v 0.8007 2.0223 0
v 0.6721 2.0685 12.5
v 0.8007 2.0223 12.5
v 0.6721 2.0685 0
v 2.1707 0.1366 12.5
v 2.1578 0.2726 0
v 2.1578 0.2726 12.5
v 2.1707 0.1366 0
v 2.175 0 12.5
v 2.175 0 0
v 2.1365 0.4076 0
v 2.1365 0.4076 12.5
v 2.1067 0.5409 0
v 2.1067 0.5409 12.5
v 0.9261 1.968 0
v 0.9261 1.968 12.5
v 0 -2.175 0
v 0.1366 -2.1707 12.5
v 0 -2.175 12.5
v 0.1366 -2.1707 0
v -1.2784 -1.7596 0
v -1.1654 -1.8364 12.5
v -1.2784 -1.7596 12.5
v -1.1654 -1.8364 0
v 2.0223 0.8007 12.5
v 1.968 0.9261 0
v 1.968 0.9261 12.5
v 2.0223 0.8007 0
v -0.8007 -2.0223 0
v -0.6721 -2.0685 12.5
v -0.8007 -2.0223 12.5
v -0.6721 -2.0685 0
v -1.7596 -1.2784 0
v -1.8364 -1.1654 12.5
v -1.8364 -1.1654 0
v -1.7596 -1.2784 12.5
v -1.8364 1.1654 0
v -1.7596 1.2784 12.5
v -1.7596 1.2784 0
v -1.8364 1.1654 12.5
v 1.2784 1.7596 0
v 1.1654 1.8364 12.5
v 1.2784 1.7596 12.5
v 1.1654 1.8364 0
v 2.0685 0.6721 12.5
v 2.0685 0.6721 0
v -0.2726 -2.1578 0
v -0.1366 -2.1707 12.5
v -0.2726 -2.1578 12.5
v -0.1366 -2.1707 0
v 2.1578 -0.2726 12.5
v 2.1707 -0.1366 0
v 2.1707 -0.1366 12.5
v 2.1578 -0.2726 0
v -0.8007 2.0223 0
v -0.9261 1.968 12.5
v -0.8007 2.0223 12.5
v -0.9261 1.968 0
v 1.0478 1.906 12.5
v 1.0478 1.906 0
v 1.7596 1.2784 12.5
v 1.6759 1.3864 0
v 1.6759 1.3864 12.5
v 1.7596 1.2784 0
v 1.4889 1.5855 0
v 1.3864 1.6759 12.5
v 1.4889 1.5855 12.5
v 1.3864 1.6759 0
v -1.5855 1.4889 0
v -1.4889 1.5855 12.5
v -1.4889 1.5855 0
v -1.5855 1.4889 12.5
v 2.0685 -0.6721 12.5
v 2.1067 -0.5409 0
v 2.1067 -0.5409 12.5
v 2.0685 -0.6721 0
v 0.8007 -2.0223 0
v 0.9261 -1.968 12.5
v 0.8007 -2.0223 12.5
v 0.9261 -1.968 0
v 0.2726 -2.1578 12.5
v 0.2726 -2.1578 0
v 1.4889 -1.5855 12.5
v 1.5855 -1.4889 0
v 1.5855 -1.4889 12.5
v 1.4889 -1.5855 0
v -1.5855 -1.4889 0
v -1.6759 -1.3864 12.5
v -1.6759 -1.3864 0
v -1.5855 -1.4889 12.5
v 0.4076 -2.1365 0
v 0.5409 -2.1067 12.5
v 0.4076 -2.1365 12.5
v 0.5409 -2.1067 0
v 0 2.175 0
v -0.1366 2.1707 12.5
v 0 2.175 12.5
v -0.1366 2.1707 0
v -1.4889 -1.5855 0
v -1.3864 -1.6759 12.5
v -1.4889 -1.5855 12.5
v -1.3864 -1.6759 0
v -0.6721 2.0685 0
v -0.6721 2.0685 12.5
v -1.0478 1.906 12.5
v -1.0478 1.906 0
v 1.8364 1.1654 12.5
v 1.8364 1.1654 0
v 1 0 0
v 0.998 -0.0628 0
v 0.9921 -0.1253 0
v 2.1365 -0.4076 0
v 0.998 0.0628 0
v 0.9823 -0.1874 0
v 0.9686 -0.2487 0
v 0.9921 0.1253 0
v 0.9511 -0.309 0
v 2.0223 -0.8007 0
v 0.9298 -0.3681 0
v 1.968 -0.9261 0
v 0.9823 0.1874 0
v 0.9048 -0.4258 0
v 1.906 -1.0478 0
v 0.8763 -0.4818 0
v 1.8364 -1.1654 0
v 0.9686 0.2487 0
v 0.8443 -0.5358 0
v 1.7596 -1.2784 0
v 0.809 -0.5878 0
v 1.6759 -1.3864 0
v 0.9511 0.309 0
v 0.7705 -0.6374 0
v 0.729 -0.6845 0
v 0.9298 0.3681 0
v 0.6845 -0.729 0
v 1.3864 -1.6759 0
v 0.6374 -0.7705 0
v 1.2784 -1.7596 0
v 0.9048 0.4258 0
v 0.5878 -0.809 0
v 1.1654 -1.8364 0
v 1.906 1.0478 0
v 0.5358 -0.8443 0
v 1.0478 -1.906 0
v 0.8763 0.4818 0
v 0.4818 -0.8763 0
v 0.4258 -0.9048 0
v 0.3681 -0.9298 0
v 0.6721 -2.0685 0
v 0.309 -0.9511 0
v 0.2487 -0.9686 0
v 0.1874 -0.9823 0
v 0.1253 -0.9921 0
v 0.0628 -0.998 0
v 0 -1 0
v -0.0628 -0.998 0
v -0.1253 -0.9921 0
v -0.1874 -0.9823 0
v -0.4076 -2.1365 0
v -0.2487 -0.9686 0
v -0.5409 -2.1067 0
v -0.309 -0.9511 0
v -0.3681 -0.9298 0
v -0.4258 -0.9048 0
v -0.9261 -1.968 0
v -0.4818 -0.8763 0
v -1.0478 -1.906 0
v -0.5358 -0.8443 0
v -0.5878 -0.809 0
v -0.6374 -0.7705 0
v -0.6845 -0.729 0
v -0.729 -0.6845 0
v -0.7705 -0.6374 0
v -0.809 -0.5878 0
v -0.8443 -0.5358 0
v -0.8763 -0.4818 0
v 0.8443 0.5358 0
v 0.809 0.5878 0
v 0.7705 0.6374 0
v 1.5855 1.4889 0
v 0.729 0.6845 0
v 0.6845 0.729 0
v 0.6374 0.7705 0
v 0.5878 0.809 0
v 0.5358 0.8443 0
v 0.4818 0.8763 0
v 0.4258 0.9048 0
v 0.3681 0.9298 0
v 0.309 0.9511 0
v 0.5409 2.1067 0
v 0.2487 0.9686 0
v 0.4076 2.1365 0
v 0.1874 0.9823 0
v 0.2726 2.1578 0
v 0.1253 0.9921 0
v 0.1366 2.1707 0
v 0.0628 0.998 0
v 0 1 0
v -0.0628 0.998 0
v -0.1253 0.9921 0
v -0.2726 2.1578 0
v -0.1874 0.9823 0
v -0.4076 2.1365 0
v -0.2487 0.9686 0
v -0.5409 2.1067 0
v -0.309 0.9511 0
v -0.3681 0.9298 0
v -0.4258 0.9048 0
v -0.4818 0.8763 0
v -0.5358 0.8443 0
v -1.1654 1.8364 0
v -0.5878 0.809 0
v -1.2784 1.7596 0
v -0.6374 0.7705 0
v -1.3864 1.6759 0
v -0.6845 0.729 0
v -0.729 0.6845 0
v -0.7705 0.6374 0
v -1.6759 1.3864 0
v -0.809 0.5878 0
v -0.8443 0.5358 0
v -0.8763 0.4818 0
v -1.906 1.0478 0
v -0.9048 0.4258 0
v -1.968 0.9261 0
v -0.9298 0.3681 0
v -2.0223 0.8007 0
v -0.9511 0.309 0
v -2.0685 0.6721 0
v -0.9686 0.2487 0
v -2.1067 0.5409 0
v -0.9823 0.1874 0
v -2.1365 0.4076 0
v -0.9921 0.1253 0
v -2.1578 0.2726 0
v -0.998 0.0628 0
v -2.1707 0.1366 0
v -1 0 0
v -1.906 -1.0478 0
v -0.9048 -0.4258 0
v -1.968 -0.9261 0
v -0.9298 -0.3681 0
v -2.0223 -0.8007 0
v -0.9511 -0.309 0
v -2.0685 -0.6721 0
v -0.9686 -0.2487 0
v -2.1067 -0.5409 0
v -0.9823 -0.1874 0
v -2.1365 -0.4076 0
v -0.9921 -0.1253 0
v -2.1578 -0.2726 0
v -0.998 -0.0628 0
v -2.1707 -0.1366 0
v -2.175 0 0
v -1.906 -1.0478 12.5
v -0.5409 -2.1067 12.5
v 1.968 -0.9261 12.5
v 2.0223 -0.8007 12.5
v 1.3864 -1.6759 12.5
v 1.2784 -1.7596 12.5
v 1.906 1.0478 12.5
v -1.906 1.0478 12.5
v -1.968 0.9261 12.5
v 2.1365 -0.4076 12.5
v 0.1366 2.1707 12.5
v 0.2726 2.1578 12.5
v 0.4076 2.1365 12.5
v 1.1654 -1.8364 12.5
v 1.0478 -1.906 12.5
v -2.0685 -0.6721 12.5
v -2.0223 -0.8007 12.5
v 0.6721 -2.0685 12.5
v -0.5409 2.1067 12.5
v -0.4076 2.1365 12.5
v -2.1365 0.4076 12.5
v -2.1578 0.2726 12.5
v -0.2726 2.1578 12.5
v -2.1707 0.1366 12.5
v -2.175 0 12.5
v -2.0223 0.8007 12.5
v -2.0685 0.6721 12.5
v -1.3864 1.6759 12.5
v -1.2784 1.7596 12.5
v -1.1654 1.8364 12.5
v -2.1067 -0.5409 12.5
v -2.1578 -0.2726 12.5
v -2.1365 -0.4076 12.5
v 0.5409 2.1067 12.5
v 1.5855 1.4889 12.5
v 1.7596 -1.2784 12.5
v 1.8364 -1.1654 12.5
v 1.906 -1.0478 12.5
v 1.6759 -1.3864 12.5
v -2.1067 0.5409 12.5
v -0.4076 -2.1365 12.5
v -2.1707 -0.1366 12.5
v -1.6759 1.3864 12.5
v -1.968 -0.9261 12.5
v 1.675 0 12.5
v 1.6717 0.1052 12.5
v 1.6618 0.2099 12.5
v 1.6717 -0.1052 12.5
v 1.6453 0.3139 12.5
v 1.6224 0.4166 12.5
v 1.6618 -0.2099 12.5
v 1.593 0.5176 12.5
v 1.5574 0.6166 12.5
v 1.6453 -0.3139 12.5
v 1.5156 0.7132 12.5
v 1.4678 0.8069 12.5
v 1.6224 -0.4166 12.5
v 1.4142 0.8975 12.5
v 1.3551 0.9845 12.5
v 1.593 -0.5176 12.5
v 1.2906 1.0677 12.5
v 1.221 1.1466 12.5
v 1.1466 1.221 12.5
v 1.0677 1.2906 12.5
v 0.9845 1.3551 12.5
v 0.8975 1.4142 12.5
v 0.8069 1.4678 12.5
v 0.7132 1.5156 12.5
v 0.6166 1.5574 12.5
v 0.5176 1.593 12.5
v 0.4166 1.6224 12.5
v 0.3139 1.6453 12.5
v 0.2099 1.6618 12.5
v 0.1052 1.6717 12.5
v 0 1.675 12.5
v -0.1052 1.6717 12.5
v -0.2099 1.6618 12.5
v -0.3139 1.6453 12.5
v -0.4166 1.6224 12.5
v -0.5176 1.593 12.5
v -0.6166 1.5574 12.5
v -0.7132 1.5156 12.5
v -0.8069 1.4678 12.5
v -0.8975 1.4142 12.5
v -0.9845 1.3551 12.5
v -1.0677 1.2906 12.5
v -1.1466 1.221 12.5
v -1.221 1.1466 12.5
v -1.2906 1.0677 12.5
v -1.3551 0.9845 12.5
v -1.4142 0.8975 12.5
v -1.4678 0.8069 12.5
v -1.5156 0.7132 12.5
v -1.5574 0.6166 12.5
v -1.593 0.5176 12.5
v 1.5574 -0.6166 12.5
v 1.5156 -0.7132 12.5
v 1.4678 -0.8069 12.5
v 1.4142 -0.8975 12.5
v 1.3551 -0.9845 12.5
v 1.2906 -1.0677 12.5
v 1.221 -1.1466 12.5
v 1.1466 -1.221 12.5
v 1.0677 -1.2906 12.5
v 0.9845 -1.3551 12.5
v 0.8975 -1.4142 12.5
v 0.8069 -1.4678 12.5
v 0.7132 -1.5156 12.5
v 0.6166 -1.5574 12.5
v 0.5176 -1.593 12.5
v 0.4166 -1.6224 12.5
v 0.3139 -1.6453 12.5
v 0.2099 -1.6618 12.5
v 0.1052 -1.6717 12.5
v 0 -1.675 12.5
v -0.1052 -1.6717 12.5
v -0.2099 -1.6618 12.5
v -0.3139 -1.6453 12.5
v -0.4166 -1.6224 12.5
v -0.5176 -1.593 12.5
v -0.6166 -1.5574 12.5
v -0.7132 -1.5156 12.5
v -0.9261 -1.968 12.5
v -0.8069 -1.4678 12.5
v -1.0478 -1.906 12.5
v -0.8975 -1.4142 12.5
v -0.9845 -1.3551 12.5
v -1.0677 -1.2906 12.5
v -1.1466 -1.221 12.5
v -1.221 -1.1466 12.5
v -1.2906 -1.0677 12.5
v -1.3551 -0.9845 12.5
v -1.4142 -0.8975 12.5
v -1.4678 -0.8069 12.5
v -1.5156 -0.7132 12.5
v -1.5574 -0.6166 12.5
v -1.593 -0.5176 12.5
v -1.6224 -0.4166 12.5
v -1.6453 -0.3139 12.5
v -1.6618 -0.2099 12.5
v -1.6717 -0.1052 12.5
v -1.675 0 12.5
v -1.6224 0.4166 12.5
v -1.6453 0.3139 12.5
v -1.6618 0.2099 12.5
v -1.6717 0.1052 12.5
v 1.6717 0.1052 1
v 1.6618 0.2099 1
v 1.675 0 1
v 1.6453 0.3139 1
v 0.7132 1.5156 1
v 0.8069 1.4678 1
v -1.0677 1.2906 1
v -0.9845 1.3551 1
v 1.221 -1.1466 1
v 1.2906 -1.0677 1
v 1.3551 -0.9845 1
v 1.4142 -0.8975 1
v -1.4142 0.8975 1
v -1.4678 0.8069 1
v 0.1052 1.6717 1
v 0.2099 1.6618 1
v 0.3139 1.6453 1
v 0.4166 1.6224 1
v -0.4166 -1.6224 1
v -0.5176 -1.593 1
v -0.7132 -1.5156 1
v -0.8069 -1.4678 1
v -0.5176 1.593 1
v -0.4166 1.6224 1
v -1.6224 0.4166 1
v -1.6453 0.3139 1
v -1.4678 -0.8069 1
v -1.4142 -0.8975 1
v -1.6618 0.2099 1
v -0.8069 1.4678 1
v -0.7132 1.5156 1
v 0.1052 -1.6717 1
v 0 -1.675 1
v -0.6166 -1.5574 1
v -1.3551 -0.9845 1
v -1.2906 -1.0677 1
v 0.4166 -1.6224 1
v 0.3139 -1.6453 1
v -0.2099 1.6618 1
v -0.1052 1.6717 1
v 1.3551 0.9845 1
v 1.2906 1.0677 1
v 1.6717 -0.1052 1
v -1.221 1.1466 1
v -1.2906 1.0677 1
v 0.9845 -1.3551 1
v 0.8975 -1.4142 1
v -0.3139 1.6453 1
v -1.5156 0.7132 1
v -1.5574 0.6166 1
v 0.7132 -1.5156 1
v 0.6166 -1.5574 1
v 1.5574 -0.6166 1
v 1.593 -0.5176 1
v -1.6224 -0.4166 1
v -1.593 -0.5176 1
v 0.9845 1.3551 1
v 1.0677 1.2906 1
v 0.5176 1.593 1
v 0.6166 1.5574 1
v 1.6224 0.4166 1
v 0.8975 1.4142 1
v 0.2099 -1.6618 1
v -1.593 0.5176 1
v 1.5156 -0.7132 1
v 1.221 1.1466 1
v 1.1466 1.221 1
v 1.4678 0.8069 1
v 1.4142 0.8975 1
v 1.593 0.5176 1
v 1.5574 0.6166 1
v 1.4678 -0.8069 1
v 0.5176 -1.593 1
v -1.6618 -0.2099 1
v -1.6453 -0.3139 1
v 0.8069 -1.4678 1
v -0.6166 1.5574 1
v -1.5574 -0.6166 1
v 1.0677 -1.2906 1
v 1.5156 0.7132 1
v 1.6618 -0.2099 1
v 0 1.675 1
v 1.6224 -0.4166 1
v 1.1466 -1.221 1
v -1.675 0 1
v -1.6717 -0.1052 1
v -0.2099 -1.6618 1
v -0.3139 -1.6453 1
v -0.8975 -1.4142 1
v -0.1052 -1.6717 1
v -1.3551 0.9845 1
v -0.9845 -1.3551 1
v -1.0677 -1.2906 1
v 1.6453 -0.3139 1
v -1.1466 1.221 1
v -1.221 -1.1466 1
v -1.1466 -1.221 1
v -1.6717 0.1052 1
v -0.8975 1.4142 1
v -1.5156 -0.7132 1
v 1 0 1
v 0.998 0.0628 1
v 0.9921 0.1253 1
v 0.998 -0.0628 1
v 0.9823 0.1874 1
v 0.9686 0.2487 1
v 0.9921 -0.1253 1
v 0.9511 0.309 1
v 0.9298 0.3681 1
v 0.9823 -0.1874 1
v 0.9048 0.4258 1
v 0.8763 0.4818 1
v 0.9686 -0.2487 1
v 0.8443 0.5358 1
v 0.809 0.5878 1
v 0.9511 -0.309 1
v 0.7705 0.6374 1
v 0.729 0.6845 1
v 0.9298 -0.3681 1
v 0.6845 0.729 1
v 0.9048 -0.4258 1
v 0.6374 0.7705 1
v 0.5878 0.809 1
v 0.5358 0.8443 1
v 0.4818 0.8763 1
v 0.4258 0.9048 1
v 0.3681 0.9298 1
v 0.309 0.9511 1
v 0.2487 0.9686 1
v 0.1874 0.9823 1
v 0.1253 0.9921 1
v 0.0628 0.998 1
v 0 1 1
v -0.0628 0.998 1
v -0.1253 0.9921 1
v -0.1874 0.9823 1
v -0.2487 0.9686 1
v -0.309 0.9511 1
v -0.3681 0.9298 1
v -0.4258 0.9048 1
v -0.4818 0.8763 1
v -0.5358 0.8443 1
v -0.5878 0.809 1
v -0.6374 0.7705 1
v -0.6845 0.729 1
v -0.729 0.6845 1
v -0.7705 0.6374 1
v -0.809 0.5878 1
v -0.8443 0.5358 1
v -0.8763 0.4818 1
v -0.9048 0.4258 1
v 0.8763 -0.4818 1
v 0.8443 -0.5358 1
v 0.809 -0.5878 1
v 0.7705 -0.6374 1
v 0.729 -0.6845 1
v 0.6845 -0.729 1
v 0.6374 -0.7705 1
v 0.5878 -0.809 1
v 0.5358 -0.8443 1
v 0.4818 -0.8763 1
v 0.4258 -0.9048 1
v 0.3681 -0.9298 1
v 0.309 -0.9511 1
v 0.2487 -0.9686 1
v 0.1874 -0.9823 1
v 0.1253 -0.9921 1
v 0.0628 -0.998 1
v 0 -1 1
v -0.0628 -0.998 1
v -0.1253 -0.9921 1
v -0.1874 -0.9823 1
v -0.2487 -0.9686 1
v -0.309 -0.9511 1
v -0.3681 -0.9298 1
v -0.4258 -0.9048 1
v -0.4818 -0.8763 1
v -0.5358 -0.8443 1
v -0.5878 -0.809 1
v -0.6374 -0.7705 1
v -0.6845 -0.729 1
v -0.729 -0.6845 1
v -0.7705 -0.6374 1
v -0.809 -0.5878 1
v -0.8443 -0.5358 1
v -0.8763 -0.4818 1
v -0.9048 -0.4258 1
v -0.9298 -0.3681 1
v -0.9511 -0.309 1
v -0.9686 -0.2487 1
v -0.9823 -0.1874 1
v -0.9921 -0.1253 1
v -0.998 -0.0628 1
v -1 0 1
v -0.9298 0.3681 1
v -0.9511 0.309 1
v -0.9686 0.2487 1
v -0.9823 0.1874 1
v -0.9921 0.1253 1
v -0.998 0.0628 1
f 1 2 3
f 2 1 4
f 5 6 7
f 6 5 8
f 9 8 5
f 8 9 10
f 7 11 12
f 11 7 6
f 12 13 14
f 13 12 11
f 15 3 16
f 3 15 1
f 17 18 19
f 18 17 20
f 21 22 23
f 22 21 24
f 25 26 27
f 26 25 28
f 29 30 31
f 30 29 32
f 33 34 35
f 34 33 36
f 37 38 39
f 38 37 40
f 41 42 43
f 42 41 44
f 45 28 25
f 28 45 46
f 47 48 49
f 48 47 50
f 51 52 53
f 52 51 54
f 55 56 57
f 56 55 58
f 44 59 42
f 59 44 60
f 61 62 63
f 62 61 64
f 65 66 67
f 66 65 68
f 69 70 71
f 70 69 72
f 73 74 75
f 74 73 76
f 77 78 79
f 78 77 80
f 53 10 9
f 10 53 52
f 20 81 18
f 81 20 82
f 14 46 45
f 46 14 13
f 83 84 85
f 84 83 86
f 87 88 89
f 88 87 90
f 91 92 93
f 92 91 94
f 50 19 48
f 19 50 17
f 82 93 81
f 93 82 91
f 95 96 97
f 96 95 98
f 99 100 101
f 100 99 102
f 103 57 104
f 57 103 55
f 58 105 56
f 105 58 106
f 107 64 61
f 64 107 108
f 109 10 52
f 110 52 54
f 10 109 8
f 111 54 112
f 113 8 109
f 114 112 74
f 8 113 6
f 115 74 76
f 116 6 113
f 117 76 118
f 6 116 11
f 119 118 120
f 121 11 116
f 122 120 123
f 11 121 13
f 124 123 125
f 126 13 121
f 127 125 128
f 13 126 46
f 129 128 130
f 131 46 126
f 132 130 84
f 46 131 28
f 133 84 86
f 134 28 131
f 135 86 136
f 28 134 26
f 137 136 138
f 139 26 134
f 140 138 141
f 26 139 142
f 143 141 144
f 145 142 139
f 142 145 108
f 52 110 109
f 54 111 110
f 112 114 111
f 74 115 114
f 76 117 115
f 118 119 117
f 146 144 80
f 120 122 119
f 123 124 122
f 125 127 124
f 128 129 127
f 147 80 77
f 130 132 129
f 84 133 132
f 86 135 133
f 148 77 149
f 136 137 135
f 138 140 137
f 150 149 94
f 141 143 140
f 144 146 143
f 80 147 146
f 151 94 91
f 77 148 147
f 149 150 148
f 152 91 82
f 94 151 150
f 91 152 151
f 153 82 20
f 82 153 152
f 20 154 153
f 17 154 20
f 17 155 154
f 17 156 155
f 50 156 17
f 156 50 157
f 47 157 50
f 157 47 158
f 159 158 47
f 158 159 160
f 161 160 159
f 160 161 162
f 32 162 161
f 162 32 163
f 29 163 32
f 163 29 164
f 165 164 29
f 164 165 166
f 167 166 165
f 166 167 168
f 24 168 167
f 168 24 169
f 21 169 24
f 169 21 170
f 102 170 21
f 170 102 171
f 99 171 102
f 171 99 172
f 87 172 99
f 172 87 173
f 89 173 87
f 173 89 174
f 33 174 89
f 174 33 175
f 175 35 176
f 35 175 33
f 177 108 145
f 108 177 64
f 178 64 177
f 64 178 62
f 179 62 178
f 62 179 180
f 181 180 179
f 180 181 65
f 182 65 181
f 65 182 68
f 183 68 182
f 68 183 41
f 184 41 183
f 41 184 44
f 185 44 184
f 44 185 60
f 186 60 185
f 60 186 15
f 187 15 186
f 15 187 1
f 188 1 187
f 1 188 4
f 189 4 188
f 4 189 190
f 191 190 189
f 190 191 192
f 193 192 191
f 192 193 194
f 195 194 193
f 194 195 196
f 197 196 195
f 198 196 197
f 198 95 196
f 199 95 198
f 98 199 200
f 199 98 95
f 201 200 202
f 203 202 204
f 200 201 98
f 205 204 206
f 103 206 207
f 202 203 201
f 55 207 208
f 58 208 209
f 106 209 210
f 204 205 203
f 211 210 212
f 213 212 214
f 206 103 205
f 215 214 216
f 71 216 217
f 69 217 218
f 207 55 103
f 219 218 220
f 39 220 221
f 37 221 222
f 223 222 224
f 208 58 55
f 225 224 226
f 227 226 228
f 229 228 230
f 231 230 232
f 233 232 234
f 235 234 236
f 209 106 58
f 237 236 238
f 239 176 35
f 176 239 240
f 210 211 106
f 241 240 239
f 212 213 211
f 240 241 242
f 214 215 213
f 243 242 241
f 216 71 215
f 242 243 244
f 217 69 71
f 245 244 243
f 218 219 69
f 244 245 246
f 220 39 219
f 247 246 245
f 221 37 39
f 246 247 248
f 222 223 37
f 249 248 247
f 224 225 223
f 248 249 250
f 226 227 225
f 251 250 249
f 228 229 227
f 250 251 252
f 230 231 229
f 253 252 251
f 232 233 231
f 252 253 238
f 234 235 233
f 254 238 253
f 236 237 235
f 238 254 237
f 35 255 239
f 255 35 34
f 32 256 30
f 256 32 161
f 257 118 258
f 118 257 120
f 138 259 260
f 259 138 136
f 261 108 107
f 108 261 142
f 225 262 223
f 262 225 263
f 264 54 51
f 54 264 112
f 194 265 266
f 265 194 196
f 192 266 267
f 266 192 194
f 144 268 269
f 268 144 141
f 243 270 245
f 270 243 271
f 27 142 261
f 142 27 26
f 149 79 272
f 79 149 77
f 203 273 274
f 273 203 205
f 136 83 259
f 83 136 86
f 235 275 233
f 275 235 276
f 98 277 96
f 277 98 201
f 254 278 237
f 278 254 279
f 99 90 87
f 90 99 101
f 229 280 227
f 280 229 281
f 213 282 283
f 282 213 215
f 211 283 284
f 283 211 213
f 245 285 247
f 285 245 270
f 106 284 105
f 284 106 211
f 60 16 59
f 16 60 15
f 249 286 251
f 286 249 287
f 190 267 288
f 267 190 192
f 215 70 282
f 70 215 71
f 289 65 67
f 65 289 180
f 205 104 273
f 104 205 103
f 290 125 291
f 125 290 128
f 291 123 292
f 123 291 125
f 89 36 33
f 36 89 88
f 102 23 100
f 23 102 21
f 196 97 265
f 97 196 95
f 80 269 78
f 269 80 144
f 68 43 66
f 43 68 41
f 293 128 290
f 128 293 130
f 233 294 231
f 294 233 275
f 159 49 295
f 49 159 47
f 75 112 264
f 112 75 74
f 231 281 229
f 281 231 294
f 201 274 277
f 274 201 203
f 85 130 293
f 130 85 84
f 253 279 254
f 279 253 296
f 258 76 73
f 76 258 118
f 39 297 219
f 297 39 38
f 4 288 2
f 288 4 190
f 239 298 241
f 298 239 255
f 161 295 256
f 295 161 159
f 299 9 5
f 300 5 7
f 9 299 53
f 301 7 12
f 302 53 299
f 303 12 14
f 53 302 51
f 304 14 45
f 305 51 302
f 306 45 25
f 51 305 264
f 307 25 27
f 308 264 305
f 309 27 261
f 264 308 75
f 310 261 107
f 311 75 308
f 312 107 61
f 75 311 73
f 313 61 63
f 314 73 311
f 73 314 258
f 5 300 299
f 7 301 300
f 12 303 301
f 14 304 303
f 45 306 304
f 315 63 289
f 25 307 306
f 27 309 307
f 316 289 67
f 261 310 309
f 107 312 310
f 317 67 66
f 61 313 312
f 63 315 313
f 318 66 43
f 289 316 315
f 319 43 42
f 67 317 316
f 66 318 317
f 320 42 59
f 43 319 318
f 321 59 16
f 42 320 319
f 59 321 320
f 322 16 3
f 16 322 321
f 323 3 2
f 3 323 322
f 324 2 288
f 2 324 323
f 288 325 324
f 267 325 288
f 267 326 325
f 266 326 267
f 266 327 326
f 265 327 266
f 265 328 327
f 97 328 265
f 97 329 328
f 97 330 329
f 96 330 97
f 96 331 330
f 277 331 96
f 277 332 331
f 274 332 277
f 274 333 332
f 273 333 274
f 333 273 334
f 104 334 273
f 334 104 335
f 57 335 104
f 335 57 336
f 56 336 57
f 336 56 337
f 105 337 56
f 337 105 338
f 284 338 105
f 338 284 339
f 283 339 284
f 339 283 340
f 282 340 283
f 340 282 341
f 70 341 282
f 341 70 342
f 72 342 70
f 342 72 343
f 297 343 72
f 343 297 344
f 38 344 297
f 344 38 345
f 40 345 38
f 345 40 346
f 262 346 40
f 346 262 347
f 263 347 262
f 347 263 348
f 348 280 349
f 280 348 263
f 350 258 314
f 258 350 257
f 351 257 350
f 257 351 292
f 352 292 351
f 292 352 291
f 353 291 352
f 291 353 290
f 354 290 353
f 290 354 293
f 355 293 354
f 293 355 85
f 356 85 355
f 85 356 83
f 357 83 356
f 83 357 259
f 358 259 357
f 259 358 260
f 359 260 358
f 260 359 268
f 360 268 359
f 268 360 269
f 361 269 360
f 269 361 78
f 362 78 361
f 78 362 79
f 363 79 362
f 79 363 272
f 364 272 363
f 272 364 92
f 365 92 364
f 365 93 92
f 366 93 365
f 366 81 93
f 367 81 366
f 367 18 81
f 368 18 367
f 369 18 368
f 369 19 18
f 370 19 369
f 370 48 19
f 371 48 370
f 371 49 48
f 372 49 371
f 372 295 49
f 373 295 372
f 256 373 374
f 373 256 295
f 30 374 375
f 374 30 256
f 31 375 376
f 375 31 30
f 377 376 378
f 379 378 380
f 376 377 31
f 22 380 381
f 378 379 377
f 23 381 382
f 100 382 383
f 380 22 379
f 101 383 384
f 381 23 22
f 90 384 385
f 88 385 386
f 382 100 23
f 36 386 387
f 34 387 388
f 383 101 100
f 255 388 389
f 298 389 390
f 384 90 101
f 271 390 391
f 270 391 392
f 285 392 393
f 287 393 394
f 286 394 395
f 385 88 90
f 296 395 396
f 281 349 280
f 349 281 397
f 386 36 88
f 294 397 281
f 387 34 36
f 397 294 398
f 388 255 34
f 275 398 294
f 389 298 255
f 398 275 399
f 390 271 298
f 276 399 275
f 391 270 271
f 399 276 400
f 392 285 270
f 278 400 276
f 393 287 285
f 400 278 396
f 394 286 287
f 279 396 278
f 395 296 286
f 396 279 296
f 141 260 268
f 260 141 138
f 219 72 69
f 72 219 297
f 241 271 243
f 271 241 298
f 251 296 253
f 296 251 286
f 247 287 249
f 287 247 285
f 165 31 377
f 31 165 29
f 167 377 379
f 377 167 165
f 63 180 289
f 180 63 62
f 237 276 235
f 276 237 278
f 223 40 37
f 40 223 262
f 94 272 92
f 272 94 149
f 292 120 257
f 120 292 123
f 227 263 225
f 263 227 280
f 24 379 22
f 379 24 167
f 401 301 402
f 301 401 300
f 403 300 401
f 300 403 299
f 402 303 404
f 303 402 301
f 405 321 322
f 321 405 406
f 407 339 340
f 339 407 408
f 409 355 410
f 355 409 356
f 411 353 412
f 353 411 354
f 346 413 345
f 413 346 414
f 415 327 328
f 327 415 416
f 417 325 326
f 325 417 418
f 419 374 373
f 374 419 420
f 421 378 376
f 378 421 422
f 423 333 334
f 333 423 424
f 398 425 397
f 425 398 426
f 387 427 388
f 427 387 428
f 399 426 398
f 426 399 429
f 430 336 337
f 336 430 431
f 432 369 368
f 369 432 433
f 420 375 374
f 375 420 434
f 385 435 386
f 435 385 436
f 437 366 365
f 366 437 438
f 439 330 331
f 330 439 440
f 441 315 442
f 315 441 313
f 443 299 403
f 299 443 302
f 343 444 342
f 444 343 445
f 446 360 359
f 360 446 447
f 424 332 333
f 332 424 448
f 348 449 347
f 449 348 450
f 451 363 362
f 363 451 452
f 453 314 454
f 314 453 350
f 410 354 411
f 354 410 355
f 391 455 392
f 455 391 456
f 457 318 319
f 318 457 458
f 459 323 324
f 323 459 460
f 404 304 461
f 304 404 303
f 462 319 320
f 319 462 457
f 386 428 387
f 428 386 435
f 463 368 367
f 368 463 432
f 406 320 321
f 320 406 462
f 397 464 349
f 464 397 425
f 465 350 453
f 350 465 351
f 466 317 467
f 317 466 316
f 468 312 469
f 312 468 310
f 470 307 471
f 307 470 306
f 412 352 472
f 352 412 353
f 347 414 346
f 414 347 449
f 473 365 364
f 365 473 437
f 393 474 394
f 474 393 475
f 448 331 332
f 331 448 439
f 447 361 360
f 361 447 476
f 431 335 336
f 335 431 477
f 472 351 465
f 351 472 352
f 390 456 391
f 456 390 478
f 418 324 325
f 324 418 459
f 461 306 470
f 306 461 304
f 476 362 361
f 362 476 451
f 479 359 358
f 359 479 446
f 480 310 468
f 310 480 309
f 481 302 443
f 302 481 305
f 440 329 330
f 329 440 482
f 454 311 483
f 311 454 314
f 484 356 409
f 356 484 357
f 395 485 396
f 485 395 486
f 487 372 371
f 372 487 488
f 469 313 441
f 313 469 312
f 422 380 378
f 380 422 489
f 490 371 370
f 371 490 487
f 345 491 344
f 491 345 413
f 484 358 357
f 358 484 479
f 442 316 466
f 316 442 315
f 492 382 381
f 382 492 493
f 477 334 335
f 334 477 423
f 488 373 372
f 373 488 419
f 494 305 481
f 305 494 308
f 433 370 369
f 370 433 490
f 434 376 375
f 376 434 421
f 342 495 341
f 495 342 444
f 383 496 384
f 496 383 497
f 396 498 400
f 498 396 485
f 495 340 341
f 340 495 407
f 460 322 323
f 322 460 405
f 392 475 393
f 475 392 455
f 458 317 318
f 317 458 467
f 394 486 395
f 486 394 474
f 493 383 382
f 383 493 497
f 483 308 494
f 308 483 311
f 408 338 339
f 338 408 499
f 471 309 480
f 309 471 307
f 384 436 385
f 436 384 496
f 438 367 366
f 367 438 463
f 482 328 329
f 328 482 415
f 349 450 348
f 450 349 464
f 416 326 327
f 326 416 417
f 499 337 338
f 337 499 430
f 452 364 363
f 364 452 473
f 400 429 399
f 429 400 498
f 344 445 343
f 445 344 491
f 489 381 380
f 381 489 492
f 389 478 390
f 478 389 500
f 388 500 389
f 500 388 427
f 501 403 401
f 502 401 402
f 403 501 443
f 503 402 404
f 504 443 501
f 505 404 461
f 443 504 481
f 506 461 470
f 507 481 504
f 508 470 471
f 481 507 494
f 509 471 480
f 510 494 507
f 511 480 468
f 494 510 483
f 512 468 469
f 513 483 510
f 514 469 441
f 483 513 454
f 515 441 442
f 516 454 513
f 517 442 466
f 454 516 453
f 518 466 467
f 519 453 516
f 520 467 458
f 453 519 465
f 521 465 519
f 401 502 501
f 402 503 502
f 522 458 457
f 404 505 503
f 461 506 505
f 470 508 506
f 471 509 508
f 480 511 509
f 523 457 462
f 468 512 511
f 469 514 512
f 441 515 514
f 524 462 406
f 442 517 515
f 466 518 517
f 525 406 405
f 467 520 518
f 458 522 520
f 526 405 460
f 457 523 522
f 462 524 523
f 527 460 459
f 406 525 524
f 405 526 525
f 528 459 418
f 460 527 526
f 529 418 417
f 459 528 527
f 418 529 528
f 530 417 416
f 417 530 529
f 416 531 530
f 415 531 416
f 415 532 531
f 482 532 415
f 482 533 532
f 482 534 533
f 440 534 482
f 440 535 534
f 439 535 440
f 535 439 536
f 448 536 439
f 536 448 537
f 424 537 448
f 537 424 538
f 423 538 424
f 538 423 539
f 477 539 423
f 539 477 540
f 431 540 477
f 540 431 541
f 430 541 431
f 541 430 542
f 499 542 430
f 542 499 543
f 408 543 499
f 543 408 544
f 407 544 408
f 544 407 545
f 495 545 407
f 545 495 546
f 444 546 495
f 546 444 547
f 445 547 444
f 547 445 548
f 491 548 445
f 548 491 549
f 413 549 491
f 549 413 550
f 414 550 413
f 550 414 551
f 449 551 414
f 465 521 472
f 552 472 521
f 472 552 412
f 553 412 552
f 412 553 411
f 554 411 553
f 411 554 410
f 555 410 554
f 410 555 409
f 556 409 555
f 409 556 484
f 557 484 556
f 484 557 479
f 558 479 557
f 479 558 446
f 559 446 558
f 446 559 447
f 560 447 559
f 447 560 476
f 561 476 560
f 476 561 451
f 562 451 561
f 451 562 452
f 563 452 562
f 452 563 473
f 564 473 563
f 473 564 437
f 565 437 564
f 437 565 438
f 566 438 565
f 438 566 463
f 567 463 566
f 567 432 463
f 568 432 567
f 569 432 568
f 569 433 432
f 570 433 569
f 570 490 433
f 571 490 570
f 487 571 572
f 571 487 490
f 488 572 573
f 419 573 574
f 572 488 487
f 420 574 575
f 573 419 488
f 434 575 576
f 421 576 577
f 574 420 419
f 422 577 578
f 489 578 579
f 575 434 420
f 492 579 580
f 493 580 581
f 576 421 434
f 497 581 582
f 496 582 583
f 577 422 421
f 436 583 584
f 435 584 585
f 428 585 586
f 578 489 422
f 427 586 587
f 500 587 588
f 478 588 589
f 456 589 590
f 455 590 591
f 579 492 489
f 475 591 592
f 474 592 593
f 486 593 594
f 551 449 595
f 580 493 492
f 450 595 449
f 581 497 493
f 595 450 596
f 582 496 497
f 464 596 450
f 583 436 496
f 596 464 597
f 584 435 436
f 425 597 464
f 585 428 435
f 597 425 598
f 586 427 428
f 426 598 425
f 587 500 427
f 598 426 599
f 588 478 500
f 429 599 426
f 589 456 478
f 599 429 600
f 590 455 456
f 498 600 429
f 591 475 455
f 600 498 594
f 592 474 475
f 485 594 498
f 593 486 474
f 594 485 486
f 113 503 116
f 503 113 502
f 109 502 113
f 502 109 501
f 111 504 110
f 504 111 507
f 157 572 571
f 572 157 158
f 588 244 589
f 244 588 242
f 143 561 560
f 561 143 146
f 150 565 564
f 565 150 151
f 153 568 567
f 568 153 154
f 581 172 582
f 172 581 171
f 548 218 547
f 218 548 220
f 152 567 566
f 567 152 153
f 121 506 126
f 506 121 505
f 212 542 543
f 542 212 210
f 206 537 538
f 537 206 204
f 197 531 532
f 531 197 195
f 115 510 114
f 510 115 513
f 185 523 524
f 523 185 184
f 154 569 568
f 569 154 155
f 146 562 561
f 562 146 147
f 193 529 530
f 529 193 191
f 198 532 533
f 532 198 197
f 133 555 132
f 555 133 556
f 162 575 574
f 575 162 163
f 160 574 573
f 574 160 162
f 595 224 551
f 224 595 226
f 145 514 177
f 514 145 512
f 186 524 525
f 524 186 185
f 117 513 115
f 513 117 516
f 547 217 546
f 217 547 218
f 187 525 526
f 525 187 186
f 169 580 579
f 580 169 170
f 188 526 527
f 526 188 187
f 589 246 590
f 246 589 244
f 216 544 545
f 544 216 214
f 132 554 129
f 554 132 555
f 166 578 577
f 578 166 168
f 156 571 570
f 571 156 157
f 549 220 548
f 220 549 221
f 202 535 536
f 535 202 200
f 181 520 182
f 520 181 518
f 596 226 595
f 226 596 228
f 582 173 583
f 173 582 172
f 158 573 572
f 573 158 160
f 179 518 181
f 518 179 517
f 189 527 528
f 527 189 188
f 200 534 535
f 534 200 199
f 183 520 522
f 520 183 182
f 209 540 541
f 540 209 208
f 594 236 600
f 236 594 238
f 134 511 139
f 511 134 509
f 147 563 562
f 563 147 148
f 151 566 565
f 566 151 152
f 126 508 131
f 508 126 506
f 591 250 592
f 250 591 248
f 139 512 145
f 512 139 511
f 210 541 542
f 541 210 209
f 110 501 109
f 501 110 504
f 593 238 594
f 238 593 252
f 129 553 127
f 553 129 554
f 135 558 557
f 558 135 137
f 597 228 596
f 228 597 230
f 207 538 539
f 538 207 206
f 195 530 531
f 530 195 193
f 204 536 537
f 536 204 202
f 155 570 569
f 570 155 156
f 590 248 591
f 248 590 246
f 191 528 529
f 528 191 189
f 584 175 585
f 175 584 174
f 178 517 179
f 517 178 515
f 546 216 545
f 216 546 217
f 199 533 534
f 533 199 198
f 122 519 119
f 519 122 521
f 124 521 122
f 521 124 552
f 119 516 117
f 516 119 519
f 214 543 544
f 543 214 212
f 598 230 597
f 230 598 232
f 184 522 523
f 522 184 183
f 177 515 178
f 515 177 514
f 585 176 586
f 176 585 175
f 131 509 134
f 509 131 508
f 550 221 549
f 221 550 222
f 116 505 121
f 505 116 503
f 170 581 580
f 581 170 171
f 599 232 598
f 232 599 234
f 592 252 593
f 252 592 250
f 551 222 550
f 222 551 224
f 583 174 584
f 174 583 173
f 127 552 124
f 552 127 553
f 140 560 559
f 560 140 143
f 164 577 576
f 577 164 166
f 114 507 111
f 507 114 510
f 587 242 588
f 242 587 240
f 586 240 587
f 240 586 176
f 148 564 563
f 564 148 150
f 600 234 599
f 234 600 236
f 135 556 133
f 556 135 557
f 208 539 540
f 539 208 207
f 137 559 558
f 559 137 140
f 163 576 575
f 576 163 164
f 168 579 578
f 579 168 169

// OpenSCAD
$fn=100;

spring_diameter = 4.8;
spring_height = 25;
wall_thickness = 0.5;
upper_height = spring_height/2;


module upper() {
  difference() {
    translate([0,0,upper_height/2]) cylinder(r=(spring_diameter - 0.45)/2, h=upper_height, center=true);
    translate([0,0,upper_height/2]) cylinder(r=((spring_diameter - 0.45)/2) - wall_thickness, h=upper_height+1, center=true);
  }
  difference() {
    translate([0,0,wall_thickness]) cylinder(r=(spring_diameter - 0.45)/2, h=wall_thickness*2, center=true);
    translate([0,0,wall_thickness]) cylinder(r=1, h=wall_thickness*3, center=true);
  }
}

module upperCap() {
  diameter = spring_diameter + (wall_thickness*2);
  rim_height = 1.6;
  difference() {
    union() {
      translate([0,0,rim_height/2 + spring_height/2]) cylinder(r=diameter/2, h=rim_height, center=true);
      hull() {
        translate([0,0,rim_height + spring_height/2 + 0.5]) cube(size=[diameter-0.5, 1.4, 1], center=true);
        translate([0,0,rim_height + spring_height/2 + (diameter)/2]) rotate([90,0,0]) cylinder(r=(diameter-0.5)/2, h=1.4, center=true);
      }
    }
    translate([0,0,rim_height + spring_height/2 + (diameter)/2]) rotate([90,0,0]) cylinder(r=0.62, h=3, center=true);
    translate([0,0,(upper_height/2) + rim_height - wall_thickness]) cylinder(r=(spring_diameter/2) + 0.05, h=upper_height, center=true);
  }
}

module lower() {
  translate([0,0,upper_height/2 - 2]) cylinder(r=0.95, h=upper_height, center=true);
  translate([0,0,upper_height-2]) cylinder(r=((spring_diameter - 0.45)/2) - wall_thickness - 0.05, h=2, center=true);
}

module lowerCap() {
  diameter = spring_diameter + (wall_thickness*2);
  rim_height = 1.6;
  translate([0,0,rim_height/2]) {
    difference() {
      union() {
        translate([0,0,0]) cylinder(r=diameter/2, h=rim_height, center=true);
        //translate([0,0,-1]) cylinder(r1=wall_thickness+0.5, r2=diameter/2 - 0.5, h=3, center=true);
        hull() {
          translate([0,0,0 + 0.5]) cube(size=[diameter-0.5, 1.4, 1], center=true);
          translate([0,0,0 + (diameter)/1.5]) rotate([90,0,0]) cylinder(r=(diameter-0.5)/2, h=1.4, center=true);
        }
      }
      translate([0,0,0 + (diameter)/1.5]) rotate([90,0,0]) cylinder(r=0.62, h=3, center=true);
      color("Red") translate([0,0,-1]) cylinder(r=1+0.05, h=2.5, center=true);
    }

  }

}

upper();
// translate([10,0,upper_height - 1]) rotate([180,0,0]) lower();
// translate([20,0,-upper_height]) upperCap();
// translate([30,0,0]) lowerCap();
